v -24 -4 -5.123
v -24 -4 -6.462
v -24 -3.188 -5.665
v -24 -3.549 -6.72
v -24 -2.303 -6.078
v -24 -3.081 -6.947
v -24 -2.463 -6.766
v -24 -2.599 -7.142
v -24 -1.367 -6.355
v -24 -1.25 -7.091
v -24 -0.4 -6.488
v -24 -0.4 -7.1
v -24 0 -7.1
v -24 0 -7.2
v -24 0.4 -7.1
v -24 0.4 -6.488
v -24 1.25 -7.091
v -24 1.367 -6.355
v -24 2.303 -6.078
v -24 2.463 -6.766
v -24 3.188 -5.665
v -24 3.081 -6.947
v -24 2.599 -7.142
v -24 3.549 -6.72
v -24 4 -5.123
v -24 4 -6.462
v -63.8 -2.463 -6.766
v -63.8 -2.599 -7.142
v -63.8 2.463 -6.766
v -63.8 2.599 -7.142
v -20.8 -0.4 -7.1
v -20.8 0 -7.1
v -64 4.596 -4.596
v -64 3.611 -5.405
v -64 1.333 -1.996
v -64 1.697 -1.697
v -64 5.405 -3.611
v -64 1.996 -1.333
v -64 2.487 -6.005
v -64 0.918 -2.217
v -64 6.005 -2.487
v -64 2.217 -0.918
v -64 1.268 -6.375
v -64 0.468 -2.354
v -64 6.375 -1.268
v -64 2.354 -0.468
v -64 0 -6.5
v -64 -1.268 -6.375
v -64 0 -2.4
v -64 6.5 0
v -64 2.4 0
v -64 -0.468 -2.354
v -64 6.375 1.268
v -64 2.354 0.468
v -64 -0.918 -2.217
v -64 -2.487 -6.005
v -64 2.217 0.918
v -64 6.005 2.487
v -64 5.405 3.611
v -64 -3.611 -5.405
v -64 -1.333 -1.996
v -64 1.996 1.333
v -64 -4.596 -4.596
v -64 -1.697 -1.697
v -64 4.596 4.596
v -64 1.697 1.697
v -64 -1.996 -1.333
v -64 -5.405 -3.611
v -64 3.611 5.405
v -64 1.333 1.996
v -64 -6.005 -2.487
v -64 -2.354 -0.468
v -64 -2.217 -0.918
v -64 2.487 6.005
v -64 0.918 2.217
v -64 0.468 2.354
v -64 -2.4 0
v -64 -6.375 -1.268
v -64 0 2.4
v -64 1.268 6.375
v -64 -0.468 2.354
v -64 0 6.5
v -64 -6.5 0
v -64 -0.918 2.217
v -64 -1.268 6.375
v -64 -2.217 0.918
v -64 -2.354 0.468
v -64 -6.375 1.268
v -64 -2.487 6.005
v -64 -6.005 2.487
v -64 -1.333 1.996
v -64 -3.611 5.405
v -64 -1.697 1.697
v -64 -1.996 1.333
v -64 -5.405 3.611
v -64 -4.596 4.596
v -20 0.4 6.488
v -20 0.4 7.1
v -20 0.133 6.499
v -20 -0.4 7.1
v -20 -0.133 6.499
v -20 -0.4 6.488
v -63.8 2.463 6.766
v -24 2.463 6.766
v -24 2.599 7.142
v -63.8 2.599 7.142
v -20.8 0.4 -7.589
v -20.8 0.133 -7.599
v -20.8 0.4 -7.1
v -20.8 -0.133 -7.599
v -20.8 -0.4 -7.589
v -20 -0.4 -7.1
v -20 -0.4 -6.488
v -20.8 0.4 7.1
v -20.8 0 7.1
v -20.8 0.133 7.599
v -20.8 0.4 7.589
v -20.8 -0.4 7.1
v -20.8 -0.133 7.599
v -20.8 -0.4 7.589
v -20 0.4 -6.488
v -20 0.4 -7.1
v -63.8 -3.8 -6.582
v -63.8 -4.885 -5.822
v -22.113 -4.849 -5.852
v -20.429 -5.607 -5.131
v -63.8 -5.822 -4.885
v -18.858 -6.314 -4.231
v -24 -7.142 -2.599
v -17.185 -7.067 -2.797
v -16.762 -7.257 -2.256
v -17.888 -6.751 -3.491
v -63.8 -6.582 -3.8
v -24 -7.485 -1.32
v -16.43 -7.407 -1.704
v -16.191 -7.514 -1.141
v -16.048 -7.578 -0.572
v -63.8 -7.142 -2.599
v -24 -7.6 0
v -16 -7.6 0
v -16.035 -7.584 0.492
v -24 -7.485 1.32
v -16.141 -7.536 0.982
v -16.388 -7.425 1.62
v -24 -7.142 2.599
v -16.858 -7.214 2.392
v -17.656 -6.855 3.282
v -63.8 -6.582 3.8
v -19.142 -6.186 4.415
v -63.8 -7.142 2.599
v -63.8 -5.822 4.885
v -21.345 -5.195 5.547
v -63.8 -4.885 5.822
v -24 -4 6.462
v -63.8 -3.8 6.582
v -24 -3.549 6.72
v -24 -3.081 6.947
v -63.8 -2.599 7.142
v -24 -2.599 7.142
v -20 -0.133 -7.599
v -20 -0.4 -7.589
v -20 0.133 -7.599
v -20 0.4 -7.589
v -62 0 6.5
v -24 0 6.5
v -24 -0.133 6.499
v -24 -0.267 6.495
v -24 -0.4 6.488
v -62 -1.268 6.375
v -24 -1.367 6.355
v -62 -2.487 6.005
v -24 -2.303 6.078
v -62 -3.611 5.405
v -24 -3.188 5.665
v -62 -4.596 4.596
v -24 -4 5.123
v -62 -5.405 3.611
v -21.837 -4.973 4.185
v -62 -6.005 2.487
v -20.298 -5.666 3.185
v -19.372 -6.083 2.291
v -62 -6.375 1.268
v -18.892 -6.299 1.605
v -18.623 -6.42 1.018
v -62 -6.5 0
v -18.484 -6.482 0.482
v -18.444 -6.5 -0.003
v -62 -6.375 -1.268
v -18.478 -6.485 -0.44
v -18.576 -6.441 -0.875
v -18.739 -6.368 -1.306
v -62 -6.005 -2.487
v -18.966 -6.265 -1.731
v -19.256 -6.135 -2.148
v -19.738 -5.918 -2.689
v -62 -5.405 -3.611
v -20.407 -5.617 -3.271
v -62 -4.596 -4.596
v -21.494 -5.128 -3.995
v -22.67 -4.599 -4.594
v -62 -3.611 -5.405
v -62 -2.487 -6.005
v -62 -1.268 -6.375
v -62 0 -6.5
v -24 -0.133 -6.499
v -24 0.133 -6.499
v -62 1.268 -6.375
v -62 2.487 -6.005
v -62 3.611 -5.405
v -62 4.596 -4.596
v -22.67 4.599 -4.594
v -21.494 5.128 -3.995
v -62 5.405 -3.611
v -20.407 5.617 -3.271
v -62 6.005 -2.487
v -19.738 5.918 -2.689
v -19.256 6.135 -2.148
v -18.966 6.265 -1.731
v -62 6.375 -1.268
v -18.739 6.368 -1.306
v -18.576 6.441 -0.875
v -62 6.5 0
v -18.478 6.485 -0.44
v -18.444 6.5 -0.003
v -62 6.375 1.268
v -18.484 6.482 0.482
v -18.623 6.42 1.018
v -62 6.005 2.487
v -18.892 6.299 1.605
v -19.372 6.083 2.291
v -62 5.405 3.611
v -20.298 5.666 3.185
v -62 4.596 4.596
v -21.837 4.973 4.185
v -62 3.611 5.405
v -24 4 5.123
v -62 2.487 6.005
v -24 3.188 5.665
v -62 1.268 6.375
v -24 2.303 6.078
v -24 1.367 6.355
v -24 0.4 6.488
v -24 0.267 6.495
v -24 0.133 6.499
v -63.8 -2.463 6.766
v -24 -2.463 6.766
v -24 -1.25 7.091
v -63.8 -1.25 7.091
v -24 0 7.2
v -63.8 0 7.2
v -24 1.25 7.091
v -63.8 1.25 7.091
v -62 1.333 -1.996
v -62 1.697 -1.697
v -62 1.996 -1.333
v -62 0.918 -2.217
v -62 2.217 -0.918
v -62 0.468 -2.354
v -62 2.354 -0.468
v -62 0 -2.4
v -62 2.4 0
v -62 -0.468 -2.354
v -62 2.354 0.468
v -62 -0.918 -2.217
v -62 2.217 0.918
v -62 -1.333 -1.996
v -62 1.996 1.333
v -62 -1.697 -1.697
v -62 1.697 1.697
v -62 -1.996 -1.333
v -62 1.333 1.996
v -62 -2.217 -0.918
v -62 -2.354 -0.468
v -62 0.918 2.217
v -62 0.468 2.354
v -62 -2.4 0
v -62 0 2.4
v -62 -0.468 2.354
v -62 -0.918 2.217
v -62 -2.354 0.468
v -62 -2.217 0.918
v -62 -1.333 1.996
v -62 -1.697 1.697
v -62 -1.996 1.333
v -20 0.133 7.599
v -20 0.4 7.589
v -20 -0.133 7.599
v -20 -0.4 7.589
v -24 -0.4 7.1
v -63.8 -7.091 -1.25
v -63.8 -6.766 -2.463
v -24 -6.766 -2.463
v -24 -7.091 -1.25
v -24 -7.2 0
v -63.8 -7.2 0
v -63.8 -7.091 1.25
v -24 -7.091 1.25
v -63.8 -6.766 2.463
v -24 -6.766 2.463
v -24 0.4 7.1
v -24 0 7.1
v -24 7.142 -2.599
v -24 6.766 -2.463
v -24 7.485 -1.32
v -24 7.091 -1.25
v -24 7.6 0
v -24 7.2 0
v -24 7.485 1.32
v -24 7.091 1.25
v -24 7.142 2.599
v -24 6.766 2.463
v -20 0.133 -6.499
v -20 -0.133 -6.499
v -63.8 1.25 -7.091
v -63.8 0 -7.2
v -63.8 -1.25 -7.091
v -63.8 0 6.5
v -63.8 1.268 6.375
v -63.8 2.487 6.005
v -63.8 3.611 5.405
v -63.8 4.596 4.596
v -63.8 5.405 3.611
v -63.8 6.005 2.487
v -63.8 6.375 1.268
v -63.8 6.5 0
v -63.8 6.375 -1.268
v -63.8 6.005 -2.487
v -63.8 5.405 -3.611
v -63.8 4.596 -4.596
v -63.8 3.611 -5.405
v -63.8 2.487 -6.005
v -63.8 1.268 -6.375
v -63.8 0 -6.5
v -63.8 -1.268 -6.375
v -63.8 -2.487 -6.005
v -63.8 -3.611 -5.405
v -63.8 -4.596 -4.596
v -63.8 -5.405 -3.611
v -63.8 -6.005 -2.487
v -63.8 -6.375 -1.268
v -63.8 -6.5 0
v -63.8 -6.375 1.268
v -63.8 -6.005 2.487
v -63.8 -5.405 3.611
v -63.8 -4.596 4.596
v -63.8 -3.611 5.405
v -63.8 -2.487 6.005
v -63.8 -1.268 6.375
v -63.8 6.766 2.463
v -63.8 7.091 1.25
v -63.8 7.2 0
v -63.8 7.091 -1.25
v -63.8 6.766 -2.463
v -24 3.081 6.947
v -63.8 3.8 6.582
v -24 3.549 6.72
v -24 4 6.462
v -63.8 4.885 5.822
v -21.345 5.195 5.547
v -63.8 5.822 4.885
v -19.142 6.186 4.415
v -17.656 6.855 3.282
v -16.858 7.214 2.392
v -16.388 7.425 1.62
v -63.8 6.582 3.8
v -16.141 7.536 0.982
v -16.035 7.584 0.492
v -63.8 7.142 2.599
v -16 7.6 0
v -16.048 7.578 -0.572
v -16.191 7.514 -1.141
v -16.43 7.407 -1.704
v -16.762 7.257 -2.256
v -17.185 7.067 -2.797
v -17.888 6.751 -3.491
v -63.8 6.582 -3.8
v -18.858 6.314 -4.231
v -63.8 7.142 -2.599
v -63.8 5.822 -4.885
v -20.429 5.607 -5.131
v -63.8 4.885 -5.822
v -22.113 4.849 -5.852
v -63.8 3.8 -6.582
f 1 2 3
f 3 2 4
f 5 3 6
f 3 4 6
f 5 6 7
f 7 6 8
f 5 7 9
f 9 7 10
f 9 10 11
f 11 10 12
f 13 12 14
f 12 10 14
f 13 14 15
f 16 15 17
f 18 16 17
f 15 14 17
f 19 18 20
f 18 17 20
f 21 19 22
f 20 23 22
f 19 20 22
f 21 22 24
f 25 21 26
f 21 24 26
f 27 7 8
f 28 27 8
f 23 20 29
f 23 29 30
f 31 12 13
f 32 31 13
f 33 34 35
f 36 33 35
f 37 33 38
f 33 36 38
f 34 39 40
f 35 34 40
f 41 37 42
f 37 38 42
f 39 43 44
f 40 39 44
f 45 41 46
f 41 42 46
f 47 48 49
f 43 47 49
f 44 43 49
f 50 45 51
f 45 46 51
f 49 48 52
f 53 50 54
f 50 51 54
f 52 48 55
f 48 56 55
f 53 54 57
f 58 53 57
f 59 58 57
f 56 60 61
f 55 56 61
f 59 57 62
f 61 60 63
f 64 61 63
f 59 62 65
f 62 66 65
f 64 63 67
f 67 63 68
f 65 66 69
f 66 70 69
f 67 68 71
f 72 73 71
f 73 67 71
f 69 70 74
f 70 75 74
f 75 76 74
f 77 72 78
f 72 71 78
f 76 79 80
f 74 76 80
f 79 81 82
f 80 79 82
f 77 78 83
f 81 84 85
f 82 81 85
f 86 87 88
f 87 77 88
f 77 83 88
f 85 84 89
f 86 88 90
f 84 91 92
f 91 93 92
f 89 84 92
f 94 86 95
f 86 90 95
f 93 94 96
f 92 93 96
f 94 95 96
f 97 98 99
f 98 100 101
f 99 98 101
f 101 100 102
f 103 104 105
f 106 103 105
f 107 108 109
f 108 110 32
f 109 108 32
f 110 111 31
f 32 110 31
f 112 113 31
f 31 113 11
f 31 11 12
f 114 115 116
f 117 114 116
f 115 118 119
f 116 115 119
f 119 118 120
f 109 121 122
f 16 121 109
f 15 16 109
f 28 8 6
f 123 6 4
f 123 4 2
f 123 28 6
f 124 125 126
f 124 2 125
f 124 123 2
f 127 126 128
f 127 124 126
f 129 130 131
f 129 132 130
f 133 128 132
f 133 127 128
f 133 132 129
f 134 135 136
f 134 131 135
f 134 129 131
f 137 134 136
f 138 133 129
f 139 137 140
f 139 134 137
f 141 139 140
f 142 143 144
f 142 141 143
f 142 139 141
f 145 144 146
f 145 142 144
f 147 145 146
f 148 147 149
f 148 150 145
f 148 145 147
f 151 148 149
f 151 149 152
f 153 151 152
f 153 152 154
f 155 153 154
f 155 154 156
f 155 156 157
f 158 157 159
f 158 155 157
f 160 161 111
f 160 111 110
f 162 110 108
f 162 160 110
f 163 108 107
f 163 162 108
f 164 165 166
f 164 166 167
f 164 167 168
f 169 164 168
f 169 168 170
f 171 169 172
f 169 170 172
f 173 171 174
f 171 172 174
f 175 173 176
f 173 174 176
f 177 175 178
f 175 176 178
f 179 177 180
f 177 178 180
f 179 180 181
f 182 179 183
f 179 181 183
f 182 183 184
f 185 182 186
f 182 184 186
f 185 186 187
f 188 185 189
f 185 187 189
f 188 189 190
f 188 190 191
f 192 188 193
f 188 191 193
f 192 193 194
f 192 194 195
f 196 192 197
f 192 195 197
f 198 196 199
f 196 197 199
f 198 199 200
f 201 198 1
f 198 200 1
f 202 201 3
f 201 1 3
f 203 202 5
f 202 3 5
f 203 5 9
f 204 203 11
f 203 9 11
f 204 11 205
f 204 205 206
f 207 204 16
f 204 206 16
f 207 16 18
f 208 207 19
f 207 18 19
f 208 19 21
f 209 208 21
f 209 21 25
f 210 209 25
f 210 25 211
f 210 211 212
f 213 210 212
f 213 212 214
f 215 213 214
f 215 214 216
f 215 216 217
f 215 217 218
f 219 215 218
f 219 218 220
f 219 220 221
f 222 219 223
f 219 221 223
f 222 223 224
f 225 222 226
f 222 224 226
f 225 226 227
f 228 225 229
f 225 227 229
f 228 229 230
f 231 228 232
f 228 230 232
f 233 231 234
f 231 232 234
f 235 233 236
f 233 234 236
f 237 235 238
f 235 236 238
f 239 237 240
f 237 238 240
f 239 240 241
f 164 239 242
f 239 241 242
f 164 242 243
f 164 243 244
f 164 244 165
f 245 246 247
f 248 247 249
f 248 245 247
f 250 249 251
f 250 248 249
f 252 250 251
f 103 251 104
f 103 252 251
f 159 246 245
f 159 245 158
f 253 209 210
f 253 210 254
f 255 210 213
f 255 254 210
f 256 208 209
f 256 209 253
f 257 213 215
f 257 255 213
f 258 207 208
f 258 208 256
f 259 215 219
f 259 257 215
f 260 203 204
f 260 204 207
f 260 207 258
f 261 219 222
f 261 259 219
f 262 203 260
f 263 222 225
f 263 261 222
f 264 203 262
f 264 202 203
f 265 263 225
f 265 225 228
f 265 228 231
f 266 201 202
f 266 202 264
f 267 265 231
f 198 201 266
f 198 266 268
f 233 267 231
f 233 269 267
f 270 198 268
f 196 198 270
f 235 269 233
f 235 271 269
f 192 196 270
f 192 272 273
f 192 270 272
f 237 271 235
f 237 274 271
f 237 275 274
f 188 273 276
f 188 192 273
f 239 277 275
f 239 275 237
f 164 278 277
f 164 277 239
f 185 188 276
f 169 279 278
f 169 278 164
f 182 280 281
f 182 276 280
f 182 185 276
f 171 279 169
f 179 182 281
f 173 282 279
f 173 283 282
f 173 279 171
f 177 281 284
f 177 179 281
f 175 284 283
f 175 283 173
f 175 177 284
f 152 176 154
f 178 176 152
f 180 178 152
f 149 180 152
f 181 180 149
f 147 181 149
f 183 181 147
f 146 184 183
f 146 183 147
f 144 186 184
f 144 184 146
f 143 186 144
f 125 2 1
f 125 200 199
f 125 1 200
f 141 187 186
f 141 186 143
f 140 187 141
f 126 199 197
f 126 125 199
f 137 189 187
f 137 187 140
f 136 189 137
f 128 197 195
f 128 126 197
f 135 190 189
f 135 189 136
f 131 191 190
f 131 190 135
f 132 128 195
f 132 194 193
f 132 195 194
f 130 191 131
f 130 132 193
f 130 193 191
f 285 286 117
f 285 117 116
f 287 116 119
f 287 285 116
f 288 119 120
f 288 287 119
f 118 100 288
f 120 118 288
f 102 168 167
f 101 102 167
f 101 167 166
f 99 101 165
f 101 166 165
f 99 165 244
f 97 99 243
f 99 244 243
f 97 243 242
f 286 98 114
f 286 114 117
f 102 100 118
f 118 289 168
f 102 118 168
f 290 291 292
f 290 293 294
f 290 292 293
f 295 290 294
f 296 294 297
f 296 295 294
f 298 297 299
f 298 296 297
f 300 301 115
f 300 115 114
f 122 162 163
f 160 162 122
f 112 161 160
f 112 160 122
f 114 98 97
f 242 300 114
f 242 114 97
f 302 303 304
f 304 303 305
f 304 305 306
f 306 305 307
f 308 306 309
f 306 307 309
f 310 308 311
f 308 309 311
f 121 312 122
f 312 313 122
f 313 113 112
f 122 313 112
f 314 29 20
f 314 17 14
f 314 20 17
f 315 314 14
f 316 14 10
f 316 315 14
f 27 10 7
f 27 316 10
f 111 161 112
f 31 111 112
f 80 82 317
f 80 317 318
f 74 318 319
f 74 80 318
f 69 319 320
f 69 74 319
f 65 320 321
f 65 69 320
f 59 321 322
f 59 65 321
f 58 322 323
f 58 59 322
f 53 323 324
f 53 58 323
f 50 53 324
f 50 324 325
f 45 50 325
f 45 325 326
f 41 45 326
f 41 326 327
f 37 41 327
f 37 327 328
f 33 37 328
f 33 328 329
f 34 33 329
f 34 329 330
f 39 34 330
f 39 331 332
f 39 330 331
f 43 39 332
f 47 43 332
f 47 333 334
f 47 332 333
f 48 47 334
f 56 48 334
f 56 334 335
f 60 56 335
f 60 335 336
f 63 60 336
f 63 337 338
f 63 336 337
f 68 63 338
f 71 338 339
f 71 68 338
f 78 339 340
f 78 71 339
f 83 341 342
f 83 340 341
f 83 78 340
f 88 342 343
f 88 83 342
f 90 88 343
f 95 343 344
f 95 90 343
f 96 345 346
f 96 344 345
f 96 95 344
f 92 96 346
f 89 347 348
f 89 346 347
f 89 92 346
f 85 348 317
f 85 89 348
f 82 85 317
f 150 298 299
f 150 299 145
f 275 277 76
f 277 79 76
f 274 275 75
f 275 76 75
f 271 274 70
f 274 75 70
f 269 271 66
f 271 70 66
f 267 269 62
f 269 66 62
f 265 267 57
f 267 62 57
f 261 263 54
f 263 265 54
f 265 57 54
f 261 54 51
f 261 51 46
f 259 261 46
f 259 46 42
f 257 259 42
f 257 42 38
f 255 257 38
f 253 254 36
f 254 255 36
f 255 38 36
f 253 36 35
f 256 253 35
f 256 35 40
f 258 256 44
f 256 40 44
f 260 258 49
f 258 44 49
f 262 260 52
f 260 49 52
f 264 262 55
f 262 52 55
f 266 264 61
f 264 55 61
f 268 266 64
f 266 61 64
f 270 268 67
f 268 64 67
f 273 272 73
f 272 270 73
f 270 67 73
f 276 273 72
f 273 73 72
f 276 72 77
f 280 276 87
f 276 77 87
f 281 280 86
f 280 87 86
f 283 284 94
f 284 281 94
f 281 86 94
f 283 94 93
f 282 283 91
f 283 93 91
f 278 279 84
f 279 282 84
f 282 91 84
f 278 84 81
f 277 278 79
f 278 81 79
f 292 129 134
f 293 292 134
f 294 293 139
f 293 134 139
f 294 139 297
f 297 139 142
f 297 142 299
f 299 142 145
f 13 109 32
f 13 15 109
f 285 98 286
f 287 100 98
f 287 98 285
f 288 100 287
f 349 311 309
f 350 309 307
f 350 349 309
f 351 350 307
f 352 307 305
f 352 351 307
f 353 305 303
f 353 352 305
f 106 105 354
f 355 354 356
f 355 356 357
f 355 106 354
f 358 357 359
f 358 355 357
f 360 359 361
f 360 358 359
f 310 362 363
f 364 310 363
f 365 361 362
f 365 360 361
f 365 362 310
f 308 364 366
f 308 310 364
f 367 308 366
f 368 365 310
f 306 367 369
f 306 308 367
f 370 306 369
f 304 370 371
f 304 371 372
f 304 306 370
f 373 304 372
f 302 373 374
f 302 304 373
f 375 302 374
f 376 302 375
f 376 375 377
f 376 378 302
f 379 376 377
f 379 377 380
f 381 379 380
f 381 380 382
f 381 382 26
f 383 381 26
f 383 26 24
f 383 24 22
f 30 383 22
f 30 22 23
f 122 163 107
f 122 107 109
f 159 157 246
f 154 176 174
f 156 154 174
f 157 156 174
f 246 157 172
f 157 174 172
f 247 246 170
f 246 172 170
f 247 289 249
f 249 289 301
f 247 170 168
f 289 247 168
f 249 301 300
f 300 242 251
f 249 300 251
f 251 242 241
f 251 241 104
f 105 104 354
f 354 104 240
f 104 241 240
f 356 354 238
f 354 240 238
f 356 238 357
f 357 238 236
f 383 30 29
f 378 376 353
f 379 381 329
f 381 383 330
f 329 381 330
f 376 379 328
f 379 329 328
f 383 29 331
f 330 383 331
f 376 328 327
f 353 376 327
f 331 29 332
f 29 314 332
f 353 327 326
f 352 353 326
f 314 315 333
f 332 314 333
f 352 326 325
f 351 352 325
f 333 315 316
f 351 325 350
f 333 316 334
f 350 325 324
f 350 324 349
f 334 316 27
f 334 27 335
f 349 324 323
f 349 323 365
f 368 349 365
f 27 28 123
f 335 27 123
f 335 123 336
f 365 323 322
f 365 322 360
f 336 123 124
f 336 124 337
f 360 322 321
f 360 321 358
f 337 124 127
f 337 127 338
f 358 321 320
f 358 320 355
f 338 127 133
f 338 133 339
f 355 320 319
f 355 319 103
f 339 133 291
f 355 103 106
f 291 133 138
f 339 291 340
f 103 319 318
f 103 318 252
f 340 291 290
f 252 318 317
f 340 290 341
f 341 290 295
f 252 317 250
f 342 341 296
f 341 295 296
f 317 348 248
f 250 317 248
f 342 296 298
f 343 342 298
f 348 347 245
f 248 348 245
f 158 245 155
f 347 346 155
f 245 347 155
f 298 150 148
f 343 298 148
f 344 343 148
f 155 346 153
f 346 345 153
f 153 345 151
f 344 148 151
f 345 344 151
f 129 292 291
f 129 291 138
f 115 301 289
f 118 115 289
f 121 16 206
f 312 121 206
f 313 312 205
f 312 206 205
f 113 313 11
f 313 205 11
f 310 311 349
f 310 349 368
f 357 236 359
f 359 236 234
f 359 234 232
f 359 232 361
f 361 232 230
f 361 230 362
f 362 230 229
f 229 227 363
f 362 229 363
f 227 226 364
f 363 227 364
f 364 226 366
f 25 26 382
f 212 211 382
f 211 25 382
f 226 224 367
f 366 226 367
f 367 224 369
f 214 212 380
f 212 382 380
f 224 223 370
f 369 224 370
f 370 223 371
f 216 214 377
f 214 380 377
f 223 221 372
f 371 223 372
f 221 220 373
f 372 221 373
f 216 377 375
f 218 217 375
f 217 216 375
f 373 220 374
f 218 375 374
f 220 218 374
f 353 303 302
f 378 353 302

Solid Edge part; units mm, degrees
sketch "Sketch1" plane through (0, 0, 0) normal (0, -1, 0) x (1, 0, 0)
  line L0 (-8, 7.6) -> (-63.8, 7.6)
  line L1 (-63.8, 7.6) -> (-63.8, 6.5)
  line L2 (-63.8, 6.5) -> (-64, 6.5)
  line L3 (-64, 2.4) -> (-64, 6.5)
  line L4 (-62, 2.4) -> (-64, 2.4)
  line L5 (-62, 6.5) -> (-62, 2.4)
  line L6 (-62, 6.5) -> (-24, 6.5)
  line L7 (-24, 6.5) -> (-14, 6.5)
  line L8 (-14, 6.5) -> (-14, 3.1)
  line L9 (-14, 3.1) -> (-8, 3.1)
  line L10 (0, 3.1) -> (-8, 3.1)
  line L11 (0, 3.1) -> (0, 6)
  line L12 (0, 6) -> (-8, 6)
  line L13 (-8, 6) -> (-8, 6.5)
  line L14 (-8, 6.5) -> (-8, 7.6)
revolve "RevolvedProtrusion1" add sketch "Sketch1" angle 360 about axis through (-64, 0, 0) along (1, 0, 0)
sketch "Sketch2" plane through (0, 0, 0) normal (0, 0, 1) x (1, 0, 0)
  line L0 (-16, 7.6) -> (-14, 14.7776)
  line L1 (-14, 14.7776) -> (20.3696, 14.7776)
  line L2 (20.3696, 14.7776) -> (20.3696, -22.0232)
  line L3 (20.3696, -22.0232) -> (-14, -21.4955)
  line L4 (-16, -7.6) -> (-14, -21.4955)
  line L5 (-24, -4) -> (-16, -7.6)
  line L6 (-24, 0) -> (-24, -4)
  line L7 (-24, 0) -> (-24, 4)
  line L8 (-24, 4) -> (-16, 7.6)
extrude "ExtrudedCutout_2" cut sketch "Sketch2" along normal mid plane 60
sketch "Sketch3" plane through (-24, 0, 6.3617) normal (1, 0, 0) x (0, 0, -1)
  line L0 (-0.7383, 0) -> (-0.7383, 0.4)
  line L1 (-0.7383, 0.4) -> (-0.1259, 0.4)
  line L2 (-0.7383, -0.4) -> (-0.1259, -0.4)
  line L3 (-0.7383, 0) -> (-0.7383, -0.4)
  arc A0 (-0.1259, 0.4) -> (-0.1259, -0.4) centre (6.3617, 0) ccw
extrude "ExtrudedCutout_3" add sketch "Sketch3" along normal blind 4
sketch "Sketch4" plane through (-20, 0, 6.3617) normal (1, 0, 0) x (0, 0, -1)
  line L0 (-0.7383, 0.4) -> (-1.2277, 0.4)
  line L1 (-0.7383, -0.4) -> (-1.2277, -0.4)
  line L2 (-0.7383, 0.4) -> (-0.7383, -0.4)
  arc A0 (-1.2277, 0.4) -> (-1.2277, -0.4) centre (6.3617, 0) ccw
extrude "ExtrudedProtrusion_3" add sketch "Sketch4" against normal blind 0.8
mirror "Mirror1" about plane through (0, 0, 0) normal (0, 0, 1) of "ExtrudedProtrusion_3", "ExtrudedCutout_3"
sketch "Sketch5" plane through (-64, 0, 0) normal (-1, 0, 0) x (0, -1, 0)
  line L0 (6.7658, 2.4625) -> (7.1417, 2.5994)
  arc A0 (7.1417, 2.5994) -> (7.1417, -2.5994) centre (0, 0) cw
  line L1 (6.7658, -2.4625) -> (7.1417, -2.5994)
  arc A1 (6.7658, 2.4625) -> (6.7658, -2.4625) centre (0, 0) cw
  line L2 (2.4625, -6.7658) -> (2.5994, -7.1417)
  arc A2 (2.5994, -7.1417) -> (-2.5994, -7.1417) centre (0, 0) cw
  line L3 (-2.4625, -6.7658) -> (-2.5994, -7.1417)
  arc A3 (2.4625, -6.7658) -> (-2.4625, -6.7658) centre (0, 0) cw
  line L4 (-6.7658, -2.4625) -> (-7.1417, -2.5994)
  line L5 (-6.7658, 2.4625) -> (-7.1417, 2.5994)
  arc A4 (-6.7658, 2.4625) -> (-6.7658, -2.4625) centre (0, 0) ccw
  arc A5 (-7.1417, -2.5994) -> (-7.1417, 2.5994) centre (0, 0) cw
  line L6 (-2.4625, 6.7658) -> (-2.5994, 7.1417)
  arc A6 (-2.5994, 7.1417) -> (2.5994, 7.1417) centre (0, 0) cw
  line L7 (2.4625, 6.7658) -> (2.5994, 7.1417)
  arc A7 (-2.4625, 6.7658) -> (2.4625, 6.7658) centre (0, 0) cw
extrude "ExtrudedCutout_4" cut sketch "Sketch5" against normal blind 40
